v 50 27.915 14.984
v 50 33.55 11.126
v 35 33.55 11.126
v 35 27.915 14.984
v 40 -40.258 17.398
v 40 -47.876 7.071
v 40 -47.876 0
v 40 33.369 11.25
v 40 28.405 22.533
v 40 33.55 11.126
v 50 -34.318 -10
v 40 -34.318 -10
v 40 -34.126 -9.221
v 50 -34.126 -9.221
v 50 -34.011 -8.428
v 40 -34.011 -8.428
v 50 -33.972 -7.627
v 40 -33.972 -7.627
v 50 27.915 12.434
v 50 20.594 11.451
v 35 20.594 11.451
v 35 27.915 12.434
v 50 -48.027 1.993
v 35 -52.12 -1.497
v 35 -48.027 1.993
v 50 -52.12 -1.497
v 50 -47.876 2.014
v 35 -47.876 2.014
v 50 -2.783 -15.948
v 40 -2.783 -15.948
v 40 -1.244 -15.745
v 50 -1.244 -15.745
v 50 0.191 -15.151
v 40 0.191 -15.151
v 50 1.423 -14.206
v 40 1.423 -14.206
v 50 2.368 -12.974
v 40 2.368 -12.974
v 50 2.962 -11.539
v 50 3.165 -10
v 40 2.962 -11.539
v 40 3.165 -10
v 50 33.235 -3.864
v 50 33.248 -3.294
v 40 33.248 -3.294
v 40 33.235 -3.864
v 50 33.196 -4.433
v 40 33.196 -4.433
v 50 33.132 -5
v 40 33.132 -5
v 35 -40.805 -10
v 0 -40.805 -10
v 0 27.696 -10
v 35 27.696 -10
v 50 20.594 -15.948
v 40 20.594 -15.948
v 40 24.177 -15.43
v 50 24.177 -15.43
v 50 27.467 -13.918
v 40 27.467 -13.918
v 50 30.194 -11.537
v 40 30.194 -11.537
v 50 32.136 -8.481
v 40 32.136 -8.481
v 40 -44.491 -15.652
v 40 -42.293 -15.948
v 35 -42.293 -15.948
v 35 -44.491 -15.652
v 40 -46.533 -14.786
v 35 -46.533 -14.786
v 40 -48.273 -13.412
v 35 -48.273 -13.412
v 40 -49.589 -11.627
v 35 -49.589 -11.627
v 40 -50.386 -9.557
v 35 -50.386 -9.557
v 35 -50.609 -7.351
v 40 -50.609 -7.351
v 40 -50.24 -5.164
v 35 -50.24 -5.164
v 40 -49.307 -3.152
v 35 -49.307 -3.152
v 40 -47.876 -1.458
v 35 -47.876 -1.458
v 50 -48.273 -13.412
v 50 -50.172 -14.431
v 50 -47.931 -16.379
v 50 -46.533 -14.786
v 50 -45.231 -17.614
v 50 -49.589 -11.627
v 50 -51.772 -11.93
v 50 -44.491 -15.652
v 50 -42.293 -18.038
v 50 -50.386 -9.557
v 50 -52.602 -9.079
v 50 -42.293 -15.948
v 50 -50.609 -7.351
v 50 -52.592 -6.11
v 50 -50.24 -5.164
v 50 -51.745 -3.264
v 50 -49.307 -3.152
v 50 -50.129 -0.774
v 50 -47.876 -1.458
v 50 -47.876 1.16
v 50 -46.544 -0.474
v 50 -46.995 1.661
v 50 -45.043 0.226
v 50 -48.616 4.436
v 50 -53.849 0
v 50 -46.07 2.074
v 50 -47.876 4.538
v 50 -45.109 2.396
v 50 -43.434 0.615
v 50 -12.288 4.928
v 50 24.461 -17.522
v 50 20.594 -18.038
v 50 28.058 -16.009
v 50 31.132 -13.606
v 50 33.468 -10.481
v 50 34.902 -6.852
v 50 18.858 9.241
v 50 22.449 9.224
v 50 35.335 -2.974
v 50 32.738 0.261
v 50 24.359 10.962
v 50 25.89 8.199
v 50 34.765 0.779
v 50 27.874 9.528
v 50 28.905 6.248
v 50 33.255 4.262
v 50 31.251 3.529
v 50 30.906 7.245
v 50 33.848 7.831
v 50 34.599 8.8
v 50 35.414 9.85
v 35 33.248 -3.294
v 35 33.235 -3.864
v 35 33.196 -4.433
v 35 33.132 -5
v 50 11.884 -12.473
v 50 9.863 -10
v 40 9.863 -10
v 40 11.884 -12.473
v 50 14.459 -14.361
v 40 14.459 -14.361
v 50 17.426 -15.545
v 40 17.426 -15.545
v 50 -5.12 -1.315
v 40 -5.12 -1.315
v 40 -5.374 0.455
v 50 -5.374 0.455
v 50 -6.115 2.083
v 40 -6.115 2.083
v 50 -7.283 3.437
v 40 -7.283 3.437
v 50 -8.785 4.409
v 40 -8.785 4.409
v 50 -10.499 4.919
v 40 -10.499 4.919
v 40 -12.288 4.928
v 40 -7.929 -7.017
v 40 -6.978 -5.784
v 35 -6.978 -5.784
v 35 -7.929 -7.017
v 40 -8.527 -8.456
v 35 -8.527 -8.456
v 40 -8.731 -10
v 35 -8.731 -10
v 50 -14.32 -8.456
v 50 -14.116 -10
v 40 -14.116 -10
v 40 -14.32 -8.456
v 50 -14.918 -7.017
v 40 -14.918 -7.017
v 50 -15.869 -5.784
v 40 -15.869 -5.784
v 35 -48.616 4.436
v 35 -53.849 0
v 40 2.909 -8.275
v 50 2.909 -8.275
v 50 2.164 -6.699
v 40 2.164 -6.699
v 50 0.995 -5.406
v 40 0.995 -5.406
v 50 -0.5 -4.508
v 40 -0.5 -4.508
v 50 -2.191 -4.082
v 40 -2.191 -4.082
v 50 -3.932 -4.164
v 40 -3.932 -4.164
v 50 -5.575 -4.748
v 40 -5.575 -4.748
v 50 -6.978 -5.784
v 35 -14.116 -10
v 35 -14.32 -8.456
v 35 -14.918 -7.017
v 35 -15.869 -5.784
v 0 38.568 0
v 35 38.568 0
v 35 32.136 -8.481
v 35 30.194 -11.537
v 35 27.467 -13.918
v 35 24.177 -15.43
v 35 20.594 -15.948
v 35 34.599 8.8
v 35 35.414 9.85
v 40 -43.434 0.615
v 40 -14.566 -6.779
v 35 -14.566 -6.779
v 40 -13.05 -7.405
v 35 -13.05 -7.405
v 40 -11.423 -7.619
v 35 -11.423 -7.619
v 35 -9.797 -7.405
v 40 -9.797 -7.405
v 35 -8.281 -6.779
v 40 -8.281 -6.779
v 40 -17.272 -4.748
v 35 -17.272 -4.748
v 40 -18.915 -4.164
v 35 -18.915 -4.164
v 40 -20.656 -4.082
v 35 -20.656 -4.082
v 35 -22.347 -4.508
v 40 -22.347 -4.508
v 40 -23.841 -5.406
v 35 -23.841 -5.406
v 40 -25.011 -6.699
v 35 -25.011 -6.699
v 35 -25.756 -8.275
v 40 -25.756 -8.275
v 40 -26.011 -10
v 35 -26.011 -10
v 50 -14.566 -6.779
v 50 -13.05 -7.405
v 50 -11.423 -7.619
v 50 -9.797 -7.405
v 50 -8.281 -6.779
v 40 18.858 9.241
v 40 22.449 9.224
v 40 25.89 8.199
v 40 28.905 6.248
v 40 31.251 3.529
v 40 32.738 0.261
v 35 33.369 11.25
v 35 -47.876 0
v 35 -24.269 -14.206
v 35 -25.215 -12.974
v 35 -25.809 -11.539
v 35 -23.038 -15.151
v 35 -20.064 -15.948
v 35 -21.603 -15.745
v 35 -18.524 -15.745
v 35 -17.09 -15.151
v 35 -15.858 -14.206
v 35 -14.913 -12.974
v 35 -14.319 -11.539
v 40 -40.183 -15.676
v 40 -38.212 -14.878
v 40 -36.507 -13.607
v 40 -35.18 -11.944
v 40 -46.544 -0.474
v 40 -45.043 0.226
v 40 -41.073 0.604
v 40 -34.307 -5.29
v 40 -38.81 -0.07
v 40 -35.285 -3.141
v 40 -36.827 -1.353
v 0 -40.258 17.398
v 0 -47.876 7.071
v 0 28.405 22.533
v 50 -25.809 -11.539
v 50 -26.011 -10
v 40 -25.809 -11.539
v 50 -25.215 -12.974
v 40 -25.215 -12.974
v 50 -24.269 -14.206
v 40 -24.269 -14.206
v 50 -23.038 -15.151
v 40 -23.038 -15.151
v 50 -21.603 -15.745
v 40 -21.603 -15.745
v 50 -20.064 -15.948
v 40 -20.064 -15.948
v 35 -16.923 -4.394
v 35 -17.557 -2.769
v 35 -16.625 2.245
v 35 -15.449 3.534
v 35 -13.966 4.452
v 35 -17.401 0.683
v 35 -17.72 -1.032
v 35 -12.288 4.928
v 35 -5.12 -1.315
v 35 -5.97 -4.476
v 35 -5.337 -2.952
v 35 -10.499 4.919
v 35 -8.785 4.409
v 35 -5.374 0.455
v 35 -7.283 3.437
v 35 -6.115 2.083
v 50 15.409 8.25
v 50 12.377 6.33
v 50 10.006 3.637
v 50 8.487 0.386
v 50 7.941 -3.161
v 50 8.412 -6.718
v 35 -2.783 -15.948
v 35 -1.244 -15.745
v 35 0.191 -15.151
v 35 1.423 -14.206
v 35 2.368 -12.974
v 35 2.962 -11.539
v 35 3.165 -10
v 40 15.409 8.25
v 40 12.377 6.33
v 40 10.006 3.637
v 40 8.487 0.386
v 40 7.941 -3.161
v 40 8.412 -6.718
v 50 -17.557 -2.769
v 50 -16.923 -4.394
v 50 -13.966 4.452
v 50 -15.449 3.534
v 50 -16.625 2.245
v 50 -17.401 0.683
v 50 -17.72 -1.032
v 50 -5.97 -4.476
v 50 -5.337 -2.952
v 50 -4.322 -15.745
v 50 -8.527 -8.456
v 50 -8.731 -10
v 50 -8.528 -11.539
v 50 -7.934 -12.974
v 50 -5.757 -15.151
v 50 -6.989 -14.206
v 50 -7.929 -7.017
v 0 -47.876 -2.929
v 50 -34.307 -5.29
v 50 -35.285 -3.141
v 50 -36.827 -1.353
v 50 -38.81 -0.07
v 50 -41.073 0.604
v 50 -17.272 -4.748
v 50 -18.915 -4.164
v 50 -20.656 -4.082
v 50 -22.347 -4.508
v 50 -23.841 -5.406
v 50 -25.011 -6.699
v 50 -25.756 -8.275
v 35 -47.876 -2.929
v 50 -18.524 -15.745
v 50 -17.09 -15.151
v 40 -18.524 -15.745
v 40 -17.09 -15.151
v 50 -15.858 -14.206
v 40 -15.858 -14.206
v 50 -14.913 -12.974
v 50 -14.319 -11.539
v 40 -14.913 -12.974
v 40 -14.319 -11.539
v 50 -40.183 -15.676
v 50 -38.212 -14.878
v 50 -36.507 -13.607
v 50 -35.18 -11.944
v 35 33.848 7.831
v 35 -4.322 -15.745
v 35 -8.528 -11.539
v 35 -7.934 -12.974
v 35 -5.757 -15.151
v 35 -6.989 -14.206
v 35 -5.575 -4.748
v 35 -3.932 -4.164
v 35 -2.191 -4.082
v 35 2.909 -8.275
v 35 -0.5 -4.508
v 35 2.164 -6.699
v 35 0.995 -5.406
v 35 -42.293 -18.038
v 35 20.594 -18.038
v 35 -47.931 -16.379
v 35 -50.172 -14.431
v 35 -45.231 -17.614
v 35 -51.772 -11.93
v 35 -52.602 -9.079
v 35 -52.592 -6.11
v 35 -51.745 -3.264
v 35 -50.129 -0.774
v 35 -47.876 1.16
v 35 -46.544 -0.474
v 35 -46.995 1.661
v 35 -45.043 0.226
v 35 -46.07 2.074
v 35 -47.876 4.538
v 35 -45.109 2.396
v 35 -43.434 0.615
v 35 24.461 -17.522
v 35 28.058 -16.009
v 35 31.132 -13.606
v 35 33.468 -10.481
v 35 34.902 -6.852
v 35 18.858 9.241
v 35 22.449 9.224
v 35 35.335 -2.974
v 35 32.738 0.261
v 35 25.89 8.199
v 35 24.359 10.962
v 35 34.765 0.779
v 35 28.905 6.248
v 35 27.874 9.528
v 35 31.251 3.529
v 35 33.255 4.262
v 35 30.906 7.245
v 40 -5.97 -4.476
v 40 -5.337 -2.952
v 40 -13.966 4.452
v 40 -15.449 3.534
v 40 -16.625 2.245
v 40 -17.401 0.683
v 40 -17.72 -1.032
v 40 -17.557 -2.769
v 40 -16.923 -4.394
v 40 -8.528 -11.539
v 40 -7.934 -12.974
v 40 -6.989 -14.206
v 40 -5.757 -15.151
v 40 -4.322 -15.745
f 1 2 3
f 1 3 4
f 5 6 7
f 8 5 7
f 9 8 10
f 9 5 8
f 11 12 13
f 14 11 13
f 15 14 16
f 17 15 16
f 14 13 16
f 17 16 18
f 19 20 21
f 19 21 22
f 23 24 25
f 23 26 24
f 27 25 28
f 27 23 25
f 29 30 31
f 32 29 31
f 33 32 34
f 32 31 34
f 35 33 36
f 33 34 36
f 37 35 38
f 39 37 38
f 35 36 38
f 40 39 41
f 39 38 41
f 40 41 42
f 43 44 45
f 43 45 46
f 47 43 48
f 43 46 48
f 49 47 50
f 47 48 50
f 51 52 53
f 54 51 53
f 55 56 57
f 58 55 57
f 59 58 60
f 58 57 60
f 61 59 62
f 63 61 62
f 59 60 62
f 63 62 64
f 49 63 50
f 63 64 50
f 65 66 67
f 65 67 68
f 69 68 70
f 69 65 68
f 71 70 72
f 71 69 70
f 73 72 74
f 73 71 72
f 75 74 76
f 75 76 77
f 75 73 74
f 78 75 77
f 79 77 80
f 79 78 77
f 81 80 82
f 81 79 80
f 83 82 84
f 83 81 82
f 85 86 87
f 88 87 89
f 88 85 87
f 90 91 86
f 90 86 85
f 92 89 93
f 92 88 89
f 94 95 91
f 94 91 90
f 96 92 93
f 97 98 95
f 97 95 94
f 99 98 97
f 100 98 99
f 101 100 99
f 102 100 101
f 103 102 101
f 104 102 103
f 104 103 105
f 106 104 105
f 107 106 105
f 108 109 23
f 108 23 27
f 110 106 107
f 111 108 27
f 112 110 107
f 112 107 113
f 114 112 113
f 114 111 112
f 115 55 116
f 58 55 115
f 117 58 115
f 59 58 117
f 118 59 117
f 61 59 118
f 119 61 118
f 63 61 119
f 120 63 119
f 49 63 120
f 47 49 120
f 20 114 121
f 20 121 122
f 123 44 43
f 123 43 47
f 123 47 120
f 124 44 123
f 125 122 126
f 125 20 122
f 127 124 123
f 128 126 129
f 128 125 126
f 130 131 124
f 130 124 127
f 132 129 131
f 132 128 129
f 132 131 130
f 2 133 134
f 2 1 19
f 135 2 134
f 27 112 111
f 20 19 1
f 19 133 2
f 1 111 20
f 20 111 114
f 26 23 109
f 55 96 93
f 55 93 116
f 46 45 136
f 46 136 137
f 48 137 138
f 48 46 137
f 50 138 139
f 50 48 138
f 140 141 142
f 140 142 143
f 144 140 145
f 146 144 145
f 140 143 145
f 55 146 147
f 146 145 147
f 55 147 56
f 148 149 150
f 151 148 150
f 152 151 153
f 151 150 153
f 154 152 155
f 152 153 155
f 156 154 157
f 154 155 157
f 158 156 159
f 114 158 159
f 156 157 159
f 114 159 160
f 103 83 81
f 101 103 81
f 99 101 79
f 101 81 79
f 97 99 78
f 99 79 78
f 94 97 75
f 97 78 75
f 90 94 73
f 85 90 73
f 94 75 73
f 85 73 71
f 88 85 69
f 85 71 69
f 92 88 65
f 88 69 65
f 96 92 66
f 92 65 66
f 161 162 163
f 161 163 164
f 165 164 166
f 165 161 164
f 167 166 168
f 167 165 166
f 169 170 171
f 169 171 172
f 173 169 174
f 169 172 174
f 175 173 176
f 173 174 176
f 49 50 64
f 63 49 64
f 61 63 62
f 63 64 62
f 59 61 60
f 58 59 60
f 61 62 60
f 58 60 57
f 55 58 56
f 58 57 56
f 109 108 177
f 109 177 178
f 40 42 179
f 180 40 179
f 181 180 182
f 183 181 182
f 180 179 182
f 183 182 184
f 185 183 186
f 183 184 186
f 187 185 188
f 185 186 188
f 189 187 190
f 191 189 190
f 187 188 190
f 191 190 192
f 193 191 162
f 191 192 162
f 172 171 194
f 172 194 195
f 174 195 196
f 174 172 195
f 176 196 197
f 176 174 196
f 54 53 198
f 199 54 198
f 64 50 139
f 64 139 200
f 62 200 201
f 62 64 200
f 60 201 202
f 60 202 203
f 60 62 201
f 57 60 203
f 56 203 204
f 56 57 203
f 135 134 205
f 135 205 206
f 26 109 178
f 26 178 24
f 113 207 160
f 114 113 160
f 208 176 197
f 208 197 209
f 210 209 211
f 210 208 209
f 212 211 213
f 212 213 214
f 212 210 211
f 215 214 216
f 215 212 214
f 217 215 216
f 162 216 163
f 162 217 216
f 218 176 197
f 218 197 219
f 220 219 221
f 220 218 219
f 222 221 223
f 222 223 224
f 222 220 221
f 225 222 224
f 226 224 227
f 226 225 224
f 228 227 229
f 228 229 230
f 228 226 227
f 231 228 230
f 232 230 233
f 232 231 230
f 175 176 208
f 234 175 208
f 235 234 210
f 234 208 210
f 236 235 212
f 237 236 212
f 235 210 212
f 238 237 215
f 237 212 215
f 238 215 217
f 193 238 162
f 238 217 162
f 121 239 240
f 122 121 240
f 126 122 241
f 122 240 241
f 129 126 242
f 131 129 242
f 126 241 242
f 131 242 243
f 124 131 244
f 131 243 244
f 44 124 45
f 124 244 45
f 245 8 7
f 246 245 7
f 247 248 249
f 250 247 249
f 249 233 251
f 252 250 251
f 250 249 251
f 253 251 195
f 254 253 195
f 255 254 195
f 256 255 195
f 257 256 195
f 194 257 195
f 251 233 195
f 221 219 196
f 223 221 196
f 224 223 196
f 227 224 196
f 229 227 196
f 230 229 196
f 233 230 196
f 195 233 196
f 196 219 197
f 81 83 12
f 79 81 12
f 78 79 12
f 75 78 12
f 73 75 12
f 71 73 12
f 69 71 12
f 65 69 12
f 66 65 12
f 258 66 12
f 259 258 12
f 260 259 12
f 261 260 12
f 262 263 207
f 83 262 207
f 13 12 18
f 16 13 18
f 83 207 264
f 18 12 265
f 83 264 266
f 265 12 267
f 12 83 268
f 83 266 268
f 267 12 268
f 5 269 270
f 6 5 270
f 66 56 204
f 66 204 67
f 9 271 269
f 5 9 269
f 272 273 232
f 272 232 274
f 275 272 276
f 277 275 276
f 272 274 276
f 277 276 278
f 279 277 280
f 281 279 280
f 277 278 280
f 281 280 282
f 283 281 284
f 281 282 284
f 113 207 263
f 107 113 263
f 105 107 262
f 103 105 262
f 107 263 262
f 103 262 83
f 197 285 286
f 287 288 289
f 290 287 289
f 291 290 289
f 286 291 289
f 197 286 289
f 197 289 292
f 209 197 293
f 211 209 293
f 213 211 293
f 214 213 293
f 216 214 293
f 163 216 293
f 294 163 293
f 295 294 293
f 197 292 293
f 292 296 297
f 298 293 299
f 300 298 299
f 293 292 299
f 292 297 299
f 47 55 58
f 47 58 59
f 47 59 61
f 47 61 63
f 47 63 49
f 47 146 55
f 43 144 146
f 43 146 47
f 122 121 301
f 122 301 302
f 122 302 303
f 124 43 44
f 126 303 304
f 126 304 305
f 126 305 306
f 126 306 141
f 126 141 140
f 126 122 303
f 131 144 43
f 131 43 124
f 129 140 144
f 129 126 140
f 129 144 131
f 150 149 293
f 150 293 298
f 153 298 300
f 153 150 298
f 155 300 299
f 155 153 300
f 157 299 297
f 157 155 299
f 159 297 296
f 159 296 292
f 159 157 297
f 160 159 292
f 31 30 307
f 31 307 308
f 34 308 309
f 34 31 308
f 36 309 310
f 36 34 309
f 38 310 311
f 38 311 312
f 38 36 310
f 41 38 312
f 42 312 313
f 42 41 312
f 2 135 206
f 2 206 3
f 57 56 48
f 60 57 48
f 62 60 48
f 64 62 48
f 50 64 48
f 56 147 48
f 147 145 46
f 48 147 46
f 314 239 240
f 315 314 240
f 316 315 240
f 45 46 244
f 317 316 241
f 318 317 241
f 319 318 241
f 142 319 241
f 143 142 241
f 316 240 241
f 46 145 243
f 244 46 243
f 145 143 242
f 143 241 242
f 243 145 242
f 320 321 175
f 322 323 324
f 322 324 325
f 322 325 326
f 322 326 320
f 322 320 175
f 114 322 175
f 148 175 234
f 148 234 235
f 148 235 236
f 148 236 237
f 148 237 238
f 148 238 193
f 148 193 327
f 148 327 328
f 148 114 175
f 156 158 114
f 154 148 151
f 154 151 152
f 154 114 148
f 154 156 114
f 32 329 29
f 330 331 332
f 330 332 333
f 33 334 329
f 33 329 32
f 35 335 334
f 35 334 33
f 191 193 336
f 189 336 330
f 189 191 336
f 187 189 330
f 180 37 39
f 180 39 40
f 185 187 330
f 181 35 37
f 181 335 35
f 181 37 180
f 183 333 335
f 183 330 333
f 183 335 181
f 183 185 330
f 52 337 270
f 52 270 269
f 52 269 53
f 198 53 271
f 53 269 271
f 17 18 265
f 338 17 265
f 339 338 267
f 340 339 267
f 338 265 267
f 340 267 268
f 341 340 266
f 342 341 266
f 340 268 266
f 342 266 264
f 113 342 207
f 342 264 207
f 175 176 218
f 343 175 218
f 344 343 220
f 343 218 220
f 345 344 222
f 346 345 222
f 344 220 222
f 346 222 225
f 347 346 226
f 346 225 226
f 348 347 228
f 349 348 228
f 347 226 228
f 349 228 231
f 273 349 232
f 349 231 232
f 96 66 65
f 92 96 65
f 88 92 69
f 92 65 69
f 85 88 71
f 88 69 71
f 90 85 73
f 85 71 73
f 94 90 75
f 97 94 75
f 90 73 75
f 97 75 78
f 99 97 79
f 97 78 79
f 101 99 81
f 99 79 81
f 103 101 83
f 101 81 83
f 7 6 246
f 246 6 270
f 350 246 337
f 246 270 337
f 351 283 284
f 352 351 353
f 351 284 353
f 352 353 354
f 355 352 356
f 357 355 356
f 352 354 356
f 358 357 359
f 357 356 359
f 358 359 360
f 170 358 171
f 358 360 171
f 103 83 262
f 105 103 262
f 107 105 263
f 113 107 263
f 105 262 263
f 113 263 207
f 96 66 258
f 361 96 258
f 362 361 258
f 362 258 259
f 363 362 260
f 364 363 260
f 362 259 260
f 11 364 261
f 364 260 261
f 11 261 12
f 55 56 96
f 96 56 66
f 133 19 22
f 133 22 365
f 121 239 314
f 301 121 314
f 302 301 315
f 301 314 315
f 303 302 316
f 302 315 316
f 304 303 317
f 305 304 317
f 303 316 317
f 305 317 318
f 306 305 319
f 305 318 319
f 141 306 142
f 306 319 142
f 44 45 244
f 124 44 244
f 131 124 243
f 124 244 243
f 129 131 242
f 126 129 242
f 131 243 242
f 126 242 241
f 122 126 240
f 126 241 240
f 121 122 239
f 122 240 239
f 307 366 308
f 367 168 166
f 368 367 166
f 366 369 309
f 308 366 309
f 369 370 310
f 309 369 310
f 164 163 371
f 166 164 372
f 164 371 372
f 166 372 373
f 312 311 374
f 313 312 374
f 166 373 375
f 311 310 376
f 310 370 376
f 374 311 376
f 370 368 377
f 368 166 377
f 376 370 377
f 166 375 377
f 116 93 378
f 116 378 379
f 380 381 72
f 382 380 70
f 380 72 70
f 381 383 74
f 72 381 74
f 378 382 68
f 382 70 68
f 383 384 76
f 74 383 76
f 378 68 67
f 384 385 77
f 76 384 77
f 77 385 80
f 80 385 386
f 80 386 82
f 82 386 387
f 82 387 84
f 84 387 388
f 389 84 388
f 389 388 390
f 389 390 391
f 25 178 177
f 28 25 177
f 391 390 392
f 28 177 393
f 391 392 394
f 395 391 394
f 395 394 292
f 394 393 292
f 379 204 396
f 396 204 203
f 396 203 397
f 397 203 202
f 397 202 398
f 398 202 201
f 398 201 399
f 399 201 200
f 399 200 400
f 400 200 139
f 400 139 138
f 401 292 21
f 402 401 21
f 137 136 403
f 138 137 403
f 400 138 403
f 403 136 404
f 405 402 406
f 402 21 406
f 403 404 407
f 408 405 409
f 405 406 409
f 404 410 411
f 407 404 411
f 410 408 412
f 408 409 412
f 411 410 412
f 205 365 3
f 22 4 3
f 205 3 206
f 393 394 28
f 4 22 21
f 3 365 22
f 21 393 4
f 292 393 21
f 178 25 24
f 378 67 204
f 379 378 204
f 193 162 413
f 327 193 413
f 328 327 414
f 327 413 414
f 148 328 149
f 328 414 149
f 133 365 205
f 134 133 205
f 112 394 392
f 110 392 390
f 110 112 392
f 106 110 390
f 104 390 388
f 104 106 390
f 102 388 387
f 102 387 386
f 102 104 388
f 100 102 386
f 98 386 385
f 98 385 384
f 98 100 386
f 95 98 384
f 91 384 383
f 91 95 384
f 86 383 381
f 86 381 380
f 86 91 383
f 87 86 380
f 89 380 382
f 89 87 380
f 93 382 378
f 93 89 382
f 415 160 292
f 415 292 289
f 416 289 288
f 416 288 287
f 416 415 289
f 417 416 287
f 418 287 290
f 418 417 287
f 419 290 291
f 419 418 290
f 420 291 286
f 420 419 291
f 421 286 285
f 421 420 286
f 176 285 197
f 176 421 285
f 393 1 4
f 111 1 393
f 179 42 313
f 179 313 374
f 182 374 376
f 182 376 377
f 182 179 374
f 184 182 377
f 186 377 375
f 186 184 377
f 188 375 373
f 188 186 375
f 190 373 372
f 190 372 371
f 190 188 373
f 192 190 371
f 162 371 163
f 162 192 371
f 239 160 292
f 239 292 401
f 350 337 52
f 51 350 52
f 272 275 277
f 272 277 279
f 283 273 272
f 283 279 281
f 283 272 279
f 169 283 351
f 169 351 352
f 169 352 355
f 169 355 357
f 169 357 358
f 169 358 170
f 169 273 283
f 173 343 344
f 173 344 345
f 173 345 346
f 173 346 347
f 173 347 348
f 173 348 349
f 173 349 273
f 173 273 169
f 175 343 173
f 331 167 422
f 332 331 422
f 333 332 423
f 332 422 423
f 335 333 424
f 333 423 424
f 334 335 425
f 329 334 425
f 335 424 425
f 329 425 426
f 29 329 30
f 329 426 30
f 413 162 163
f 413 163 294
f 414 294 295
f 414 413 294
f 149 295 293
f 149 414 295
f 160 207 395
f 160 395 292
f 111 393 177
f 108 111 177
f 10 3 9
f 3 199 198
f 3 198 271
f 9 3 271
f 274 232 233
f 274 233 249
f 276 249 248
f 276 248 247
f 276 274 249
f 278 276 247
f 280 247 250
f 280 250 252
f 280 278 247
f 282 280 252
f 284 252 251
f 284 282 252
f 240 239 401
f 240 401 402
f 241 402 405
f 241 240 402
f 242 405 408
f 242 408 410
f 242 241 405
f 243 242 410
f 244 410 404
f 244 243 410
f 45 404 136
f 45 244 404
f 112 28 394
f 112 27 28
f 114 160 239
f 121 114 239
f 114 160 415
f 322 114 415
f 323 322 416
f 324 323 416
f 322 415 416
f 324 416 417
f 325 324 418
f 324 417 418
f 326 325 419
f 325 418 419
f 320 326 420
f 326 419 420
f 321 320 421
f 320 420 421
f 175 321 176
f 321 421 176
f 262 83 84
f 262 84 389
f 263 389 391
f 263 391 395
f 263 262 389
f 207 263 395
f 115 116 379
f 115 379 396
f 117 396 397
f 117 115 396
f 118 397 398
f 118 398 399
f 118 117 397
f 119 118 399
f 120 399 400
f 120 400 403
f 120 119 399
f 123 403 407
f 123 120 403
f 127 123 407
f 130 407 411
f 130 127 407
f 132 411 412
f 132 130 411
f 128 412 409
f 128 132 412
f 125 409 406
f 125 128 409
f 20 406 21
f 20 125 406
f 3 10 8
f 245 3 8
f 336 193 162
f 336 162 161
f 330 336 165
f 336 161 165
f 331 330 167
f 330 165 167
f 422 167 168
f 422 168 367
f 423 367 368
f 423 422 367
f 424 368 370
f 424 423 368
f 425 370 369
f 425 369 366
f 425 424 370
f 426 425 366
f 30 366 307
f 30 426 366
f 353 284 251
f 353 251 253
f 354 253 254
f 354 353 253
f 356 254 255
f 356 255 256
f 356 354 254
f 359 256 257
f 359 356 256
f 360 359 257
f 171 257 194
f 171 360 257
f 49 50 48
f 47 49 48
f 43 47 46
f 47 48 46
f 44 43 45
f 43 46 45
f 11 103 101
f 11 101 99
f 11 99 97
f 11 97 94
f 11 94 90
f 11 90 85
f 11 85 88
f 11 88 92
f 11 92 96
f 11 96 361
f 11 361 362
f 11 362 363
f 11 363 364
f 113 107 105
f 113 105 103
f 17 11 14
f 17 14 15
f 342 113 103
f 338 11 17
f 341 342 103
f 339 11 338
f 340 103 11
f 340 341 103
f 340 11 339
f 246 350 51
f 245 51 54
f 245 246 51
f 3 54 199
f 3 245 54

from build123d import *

# Parameters (mm, degrees)
F1_DEPTH      = 40
F3_DEPTH      = 10
F3_DEPTH_BACK = 5
F5_DEPTH      = 5
F6_DEPTH      = 10


# Not quite as in the source:
# - a feature of the source that left no trace in its solid (it failed there, or was rolled back) is left out


with BuildPart() as f1:
    # F0 (on Right) → F1 (new body)
    with BuildSketch(Plane.YZ):
        Polygon((27.6961897601, -10), (38.5682727188, 0), (28.4053542368, 22.532921263), (-40.2577161056, 17.3983419039), (-47.8760995143, 7.0710678119), (-47.8760995143, -2.9289321881), (-40.8050317025, -10), align=None)
    extrude(amount=F1_DEPTH)

    # F4 (on face) → F5 (cut)
    with BuildSketch(Plane.YZ.offset(40)):
        Polygon((33.5502247129, 11.1258671229), (33.3687316656, 11.2501096426), (-47.8760995143, 0), (-47.8760995143, -2.9289321881), (-40.8050317025, -10), (27.6961897601, -10), (38.5682727188, 0), align=None)
    extrude(amount=-F5_DEPTH, mode=Mode.SUBTRACT)


with BuildPart() as f3:
    # F2 (on face) → F3 (new body, two sides)
    with BuildSketch(Plane.YZ.offset(40)) as f3_sk:
        with BuildLine():
            Line((-42.2927111518, 2.7837480747), (20.5938176628, 11.4508923365))
            Line((20.5938176628, 11.4508923365), (27.9149531109, 12.4337729067))
            Line((27.9149531109, 12.4337729067), (33.8481068611, 7.8312940896))
            Line((33.8481068611, 7.8312940896), (34.5993614092, 8.799752374))
            Line((34.5993614092, 8.799752374), (33.5502247129, 11.1258671229))
            Line((33.5502247129, 11.1258671229), (27.9149531109, 14.9835374473))
            Line((27.9149531109, 14.9835374473), (-47.8760995143, 4.5378665025))
            Line((-47.8760995143, 4.5378665025), (-47.8760995143, 2.0142345824))
            Line((-47.8760995143, 2.0142345824), (-45.1088561501, 2.3956214692))
            ThreePointArc((-45.1088561501, 2.3956214692), (-43.7140938337, 2.6862599718), (-42.2927111518, 2.7837480747))
        make_face()
        with BuildLine():
            ThreePointArc((18.8581583186, 9.2408059274), (28.9052740662, 6.2480712147), (33.2478147965, -3.2935919481))
            ThreePointArc((33.2478147965, -3.2935919481), (33.2188858392, -4.1487509974), (33.1322312395, -5))
            Line((33.1322312395, -5), (35.3348394178, -2.9740697466))
            ThreePointArc((35.3348394178, -2.9740697466), (30.9061555825, 7.2446955527), (20.5938176628, 11.4508923365))
            Line((20.5938176628, 11.4508923365), (-42.2927111518, 2.7837480747))
            Line((-42.2927111518, 2.7837480747), (-45.1088561501, 2.3956214692))
            ThreePointArc((-45.1088561501, 2.3956214692), (-46.5376854534, 1.8789836315), (-47.8760995143, 1.159876105))
            Line((-47.8760995143, 1.159876105), (-47.8760995143, -1.4576985119))
            ThreePointArc((-47.8760995143, -1.4576985119), (-45.8111546371, -0.0867559808), (-43.4339984475, 0.6151052728))
            Line((-43.4339984475, 0.6151052728), (-12.2879200079, 4.9279556079))
            Line((-12.2879200079, 4.9279556079), (18.8581583186, 9.2408059274))
        make_face()
        with BuildLine():
            Line((35.3348394178, -2.9740697466), (33.1322312395, -5))
            ThreePointArc((33.1322312395, -5), (28.9164002206, -12.8255520314), (20.5938176628, -15.9475890818))
            Line((20.5938176628, -15.9475890818), (-2.7829632369, -15.9475890818))
            Line((-2.7829632369, -15.9475890818), (-20.0637951493, -15.9475890818))
            Line((-20.0637951493, -15.9475890818), (-42.2927111518, -15.9475890818))
            ThreePointArc((-42.2927111518, -15.9475890818), (-50.056910311, -10.6186987382), (-47.8760995143, -1.4576985119))
            Line((-47.8760995143, -1.4576985119), (-47.8760995143, 1.159876105))
            ThreePointArc((-47.8760995143, 1.159876105), (-52.2891717155, -10.5342898377), (-42.2927111518, -18.0375890818))
            Line((-42.2927111518, -18.0375890818), (20.5938176628, -18.0380762327))
            ThreePointArc((20.5938176628, -18.0380762327), (31.1321051636, -13.6059298678), (35.3348394178, -2.9740697466))
        make_face()
        Polygon((-48.027382516, 1.9933844635), (-47.8760995143, 2.0142345824), (-47.8760995143, 4.5378665025), (-48.6158784645, 4.4359087223), (-53.8486540318, 0), (-52.1195121109, -1.4973431826), align=None)
        Polygon((33.5502247129, 11.1258671229), (34.5993614092, 8.799752374), (35.414042781, 9.8499755317), align=None)
        with BuildLine():
            Line((-45.1088561501, 2.3956214692), (-42.2927111518, 2.7837480747))
            ThreePointArc((-42.2927111518, 2.7837480747), (-43.7140938337, 2.6862599718), (-45.1088561501, 2.3956214692))
        make_face()
    extrude(amount=F3_DEPTH)
    extrude(f3_sk.sketch, amount=-F3_DEPTH_BACK)


with BuildPart() as f3b:
    # F2 (on face) → F3, piece 2 (new body, two sides)
    with BuildSketch(Plane.YZ.offset(40)) as f3_2_sk:
        with BuildLine():
            ThreePointArc((-5.1203578701, -1.3154927046), (-7.2833998095, 3.4372589676), (-12.2879200079, 4.9279556079))
            ThreePointArc((-12.2879200079, 4.9279556079), (-17.401198533, 0.6829450567), (-15.8689310869, -5.7837301576))
            ThreePointArc((-15.8689310869, -5.7837301576), (-11.4233791809, -7.6185140173), (-6.9778272761, -5.783730155))
            ThreePointArc((-6.9778272761, -5.783730155), (-5.603220848, -3.7349626107), (-5.1203578701, -1.3154927046))
        make_face()
    extrude(amount=F3_DEPTH)
    extrude(f3_2_sk.sketch, amount=-F3_DEPTH_BACK)


with BuildPart() as f3c:
    # F2 (on face) → F3, piece 3 (new body, two sides)
    with BuildSketch(Plane.YZ.offset(40)) as f3_3_sk:
        with BuildLine():
            ThreePointArc((-2.7829632369, -15.9475890818), (1.4226173479, -14.2055805787), (3.1646258655, -10))
            Line((3.1646258655, -10), (-8.7305522981, -10))
            ThreePointArc((-8.7305522981, -10), (-6.988543795, -14.2055805642), (-2.7829632369, -15.9475890818))
        make_face()
        with BuildLine():
            Line((-8.7305522981, -10), (3.1646258655, -10))
            ThreePointArc((3.1646258655, -10), (-0.4999292476, -4.5080448123), (-6.9778272761, -5.783730155))
            ThreePointArc((-6.9778272761, -5.783730155), (-8.274918404, -7.7169660313), (-8.7305522981, -10))
        make_face()
    extrude(amount=F3_DEPTH)
    extrude(f3_3_sk.sketch, amount=-F3_DEPTH_BACK)


with BuildPart() as f3d:
    # F2 (on face) → F3, piece 4 (new body, two sides)
    with BuildSketch(Plane.YZ.offset(40)) as f3_4_sk:
        with BuildLine():
            ThreePointArc((-20.0637951493, -15.9475890818), (-15.8582145779, -14.2055805715), (-14.1162060675, -10))
            Line((-14.1162060675, -10), (-26.0113842311, -10))
            ThreePointArc((-26.0113842311, -10), (-24.2693757208, -14.2055805715), (-20.0637951493, -15.9475890818))
        make_face()
        with BuildLine():
            ThreePointArc((-14.1162060675, -10), (-14.5718399609, -7.7169660331), (-15.8689310869, -5.7837301576))
            ThreePointArc((-15.8689310869, -5.7837301576), (-22.3468291163, -4.5080448116), (-26.0113842311, -10))
            Line((-26.0113842311, -10), (-14.1162060675, -10))
        make_face()
    extrude(amount=F3_DEPTH)
    extrude(f3_4_sk.sketch, amount=-F3_DEPTH_BACK)


with BuildPart() as f6:
    # F2 (on face) → F6 (new body)
    with BuildSketch(Plane.YZ.offset(40)):
        with BuildLine():
            ThreePointArc((-33.9720425736, -7.6269205036), (-36.8274914742, -1.3527751861), (-43.4339984475, 0.6151052728))
            ThreePointArc((-43.4339984475, 0.6151052728), (-45.8111546371, -0.0867559808), (-47.8760995143, -1.4576985119))
            Line((-47.8760995143, -1.4576985119), (-47.8760995143, -2.9289321881))
            Line((-47.8760995143, -2.9289321881), (-40.8050317025, -10))
            Line((-40.8050317025, -10), (-34.3176237359, -10))
            ThreePointArc((-34.3176237359, -10), (-34.0588911131, -8.8259756145), (-33.9720425736, -7.6269205036))
        make_face()
        with BuildLine():
            Line((-47.8760995143, -2.9289321881), (-47.8760995143, -1.4576985119))
            ThreePointArc((-47.8760995143, -1.4576985119), (-50.056910311, -10.6186987382), (-42.2927111518, -15.9475890818))
            ThreePointArc((-42.2927111518, -15.9475890818), (-37.3183811673, -14.296970488), (-34.3176237359, -10))
            Line((-34.3176237359, -10), (-40.8050317025, -10))
            Line((-40.8050317025, -10), (-47.8760995143, -2.9289321881))
        make_face()
    extrude(amount=F6_DEPTH)


with BuildPart() as f6b:
    # F2 (on face) → F6, piece 2 (new body)
    with BuildSketch(Plane.YZ.offset(40)):
        with BuildLine():
            ThreePointArc((20.5938176628, -15.9475890818), (28.9164002206, -12.8255520314), (33.1322312395, -5))
            Line((33.1322312395, -5), (27.6961897601, -10))
            Line((27.6961897601, -10), (9.8631264222, -10))
            ThreePointArc((9.8631264222, -10), (14.4594564412, -14.3612590854), (20.5938176628, -15.9475890818))
        make_face()
        with BuildLine():
            ThreePointArc((33.1322312395, -5), (33.2188858392, -4.1487509974), (33.2478147965, -3.2935919481))
            ThreePointArc((33.2478147965, -3.2935919481), (28.9052740662, 6.2480712147), (18.8581583186, 9.2408059274))
            ThreePointArc((18.8581583186, 9.2408059274), (9.1306319184, 2.0654206522), (9.8631264222, -10))
            Line((9.8631264222, -10), (27.6961897601, -10))
            Line((27.6961897601, -10), (33.1322312395, -5))
        make_face()
    extrude(amount=F6_DEPTH)


solid = Compound([f1.part, f3.part, f3b.part, f3c.part, f3d.part, f6.part, f6b.part])
